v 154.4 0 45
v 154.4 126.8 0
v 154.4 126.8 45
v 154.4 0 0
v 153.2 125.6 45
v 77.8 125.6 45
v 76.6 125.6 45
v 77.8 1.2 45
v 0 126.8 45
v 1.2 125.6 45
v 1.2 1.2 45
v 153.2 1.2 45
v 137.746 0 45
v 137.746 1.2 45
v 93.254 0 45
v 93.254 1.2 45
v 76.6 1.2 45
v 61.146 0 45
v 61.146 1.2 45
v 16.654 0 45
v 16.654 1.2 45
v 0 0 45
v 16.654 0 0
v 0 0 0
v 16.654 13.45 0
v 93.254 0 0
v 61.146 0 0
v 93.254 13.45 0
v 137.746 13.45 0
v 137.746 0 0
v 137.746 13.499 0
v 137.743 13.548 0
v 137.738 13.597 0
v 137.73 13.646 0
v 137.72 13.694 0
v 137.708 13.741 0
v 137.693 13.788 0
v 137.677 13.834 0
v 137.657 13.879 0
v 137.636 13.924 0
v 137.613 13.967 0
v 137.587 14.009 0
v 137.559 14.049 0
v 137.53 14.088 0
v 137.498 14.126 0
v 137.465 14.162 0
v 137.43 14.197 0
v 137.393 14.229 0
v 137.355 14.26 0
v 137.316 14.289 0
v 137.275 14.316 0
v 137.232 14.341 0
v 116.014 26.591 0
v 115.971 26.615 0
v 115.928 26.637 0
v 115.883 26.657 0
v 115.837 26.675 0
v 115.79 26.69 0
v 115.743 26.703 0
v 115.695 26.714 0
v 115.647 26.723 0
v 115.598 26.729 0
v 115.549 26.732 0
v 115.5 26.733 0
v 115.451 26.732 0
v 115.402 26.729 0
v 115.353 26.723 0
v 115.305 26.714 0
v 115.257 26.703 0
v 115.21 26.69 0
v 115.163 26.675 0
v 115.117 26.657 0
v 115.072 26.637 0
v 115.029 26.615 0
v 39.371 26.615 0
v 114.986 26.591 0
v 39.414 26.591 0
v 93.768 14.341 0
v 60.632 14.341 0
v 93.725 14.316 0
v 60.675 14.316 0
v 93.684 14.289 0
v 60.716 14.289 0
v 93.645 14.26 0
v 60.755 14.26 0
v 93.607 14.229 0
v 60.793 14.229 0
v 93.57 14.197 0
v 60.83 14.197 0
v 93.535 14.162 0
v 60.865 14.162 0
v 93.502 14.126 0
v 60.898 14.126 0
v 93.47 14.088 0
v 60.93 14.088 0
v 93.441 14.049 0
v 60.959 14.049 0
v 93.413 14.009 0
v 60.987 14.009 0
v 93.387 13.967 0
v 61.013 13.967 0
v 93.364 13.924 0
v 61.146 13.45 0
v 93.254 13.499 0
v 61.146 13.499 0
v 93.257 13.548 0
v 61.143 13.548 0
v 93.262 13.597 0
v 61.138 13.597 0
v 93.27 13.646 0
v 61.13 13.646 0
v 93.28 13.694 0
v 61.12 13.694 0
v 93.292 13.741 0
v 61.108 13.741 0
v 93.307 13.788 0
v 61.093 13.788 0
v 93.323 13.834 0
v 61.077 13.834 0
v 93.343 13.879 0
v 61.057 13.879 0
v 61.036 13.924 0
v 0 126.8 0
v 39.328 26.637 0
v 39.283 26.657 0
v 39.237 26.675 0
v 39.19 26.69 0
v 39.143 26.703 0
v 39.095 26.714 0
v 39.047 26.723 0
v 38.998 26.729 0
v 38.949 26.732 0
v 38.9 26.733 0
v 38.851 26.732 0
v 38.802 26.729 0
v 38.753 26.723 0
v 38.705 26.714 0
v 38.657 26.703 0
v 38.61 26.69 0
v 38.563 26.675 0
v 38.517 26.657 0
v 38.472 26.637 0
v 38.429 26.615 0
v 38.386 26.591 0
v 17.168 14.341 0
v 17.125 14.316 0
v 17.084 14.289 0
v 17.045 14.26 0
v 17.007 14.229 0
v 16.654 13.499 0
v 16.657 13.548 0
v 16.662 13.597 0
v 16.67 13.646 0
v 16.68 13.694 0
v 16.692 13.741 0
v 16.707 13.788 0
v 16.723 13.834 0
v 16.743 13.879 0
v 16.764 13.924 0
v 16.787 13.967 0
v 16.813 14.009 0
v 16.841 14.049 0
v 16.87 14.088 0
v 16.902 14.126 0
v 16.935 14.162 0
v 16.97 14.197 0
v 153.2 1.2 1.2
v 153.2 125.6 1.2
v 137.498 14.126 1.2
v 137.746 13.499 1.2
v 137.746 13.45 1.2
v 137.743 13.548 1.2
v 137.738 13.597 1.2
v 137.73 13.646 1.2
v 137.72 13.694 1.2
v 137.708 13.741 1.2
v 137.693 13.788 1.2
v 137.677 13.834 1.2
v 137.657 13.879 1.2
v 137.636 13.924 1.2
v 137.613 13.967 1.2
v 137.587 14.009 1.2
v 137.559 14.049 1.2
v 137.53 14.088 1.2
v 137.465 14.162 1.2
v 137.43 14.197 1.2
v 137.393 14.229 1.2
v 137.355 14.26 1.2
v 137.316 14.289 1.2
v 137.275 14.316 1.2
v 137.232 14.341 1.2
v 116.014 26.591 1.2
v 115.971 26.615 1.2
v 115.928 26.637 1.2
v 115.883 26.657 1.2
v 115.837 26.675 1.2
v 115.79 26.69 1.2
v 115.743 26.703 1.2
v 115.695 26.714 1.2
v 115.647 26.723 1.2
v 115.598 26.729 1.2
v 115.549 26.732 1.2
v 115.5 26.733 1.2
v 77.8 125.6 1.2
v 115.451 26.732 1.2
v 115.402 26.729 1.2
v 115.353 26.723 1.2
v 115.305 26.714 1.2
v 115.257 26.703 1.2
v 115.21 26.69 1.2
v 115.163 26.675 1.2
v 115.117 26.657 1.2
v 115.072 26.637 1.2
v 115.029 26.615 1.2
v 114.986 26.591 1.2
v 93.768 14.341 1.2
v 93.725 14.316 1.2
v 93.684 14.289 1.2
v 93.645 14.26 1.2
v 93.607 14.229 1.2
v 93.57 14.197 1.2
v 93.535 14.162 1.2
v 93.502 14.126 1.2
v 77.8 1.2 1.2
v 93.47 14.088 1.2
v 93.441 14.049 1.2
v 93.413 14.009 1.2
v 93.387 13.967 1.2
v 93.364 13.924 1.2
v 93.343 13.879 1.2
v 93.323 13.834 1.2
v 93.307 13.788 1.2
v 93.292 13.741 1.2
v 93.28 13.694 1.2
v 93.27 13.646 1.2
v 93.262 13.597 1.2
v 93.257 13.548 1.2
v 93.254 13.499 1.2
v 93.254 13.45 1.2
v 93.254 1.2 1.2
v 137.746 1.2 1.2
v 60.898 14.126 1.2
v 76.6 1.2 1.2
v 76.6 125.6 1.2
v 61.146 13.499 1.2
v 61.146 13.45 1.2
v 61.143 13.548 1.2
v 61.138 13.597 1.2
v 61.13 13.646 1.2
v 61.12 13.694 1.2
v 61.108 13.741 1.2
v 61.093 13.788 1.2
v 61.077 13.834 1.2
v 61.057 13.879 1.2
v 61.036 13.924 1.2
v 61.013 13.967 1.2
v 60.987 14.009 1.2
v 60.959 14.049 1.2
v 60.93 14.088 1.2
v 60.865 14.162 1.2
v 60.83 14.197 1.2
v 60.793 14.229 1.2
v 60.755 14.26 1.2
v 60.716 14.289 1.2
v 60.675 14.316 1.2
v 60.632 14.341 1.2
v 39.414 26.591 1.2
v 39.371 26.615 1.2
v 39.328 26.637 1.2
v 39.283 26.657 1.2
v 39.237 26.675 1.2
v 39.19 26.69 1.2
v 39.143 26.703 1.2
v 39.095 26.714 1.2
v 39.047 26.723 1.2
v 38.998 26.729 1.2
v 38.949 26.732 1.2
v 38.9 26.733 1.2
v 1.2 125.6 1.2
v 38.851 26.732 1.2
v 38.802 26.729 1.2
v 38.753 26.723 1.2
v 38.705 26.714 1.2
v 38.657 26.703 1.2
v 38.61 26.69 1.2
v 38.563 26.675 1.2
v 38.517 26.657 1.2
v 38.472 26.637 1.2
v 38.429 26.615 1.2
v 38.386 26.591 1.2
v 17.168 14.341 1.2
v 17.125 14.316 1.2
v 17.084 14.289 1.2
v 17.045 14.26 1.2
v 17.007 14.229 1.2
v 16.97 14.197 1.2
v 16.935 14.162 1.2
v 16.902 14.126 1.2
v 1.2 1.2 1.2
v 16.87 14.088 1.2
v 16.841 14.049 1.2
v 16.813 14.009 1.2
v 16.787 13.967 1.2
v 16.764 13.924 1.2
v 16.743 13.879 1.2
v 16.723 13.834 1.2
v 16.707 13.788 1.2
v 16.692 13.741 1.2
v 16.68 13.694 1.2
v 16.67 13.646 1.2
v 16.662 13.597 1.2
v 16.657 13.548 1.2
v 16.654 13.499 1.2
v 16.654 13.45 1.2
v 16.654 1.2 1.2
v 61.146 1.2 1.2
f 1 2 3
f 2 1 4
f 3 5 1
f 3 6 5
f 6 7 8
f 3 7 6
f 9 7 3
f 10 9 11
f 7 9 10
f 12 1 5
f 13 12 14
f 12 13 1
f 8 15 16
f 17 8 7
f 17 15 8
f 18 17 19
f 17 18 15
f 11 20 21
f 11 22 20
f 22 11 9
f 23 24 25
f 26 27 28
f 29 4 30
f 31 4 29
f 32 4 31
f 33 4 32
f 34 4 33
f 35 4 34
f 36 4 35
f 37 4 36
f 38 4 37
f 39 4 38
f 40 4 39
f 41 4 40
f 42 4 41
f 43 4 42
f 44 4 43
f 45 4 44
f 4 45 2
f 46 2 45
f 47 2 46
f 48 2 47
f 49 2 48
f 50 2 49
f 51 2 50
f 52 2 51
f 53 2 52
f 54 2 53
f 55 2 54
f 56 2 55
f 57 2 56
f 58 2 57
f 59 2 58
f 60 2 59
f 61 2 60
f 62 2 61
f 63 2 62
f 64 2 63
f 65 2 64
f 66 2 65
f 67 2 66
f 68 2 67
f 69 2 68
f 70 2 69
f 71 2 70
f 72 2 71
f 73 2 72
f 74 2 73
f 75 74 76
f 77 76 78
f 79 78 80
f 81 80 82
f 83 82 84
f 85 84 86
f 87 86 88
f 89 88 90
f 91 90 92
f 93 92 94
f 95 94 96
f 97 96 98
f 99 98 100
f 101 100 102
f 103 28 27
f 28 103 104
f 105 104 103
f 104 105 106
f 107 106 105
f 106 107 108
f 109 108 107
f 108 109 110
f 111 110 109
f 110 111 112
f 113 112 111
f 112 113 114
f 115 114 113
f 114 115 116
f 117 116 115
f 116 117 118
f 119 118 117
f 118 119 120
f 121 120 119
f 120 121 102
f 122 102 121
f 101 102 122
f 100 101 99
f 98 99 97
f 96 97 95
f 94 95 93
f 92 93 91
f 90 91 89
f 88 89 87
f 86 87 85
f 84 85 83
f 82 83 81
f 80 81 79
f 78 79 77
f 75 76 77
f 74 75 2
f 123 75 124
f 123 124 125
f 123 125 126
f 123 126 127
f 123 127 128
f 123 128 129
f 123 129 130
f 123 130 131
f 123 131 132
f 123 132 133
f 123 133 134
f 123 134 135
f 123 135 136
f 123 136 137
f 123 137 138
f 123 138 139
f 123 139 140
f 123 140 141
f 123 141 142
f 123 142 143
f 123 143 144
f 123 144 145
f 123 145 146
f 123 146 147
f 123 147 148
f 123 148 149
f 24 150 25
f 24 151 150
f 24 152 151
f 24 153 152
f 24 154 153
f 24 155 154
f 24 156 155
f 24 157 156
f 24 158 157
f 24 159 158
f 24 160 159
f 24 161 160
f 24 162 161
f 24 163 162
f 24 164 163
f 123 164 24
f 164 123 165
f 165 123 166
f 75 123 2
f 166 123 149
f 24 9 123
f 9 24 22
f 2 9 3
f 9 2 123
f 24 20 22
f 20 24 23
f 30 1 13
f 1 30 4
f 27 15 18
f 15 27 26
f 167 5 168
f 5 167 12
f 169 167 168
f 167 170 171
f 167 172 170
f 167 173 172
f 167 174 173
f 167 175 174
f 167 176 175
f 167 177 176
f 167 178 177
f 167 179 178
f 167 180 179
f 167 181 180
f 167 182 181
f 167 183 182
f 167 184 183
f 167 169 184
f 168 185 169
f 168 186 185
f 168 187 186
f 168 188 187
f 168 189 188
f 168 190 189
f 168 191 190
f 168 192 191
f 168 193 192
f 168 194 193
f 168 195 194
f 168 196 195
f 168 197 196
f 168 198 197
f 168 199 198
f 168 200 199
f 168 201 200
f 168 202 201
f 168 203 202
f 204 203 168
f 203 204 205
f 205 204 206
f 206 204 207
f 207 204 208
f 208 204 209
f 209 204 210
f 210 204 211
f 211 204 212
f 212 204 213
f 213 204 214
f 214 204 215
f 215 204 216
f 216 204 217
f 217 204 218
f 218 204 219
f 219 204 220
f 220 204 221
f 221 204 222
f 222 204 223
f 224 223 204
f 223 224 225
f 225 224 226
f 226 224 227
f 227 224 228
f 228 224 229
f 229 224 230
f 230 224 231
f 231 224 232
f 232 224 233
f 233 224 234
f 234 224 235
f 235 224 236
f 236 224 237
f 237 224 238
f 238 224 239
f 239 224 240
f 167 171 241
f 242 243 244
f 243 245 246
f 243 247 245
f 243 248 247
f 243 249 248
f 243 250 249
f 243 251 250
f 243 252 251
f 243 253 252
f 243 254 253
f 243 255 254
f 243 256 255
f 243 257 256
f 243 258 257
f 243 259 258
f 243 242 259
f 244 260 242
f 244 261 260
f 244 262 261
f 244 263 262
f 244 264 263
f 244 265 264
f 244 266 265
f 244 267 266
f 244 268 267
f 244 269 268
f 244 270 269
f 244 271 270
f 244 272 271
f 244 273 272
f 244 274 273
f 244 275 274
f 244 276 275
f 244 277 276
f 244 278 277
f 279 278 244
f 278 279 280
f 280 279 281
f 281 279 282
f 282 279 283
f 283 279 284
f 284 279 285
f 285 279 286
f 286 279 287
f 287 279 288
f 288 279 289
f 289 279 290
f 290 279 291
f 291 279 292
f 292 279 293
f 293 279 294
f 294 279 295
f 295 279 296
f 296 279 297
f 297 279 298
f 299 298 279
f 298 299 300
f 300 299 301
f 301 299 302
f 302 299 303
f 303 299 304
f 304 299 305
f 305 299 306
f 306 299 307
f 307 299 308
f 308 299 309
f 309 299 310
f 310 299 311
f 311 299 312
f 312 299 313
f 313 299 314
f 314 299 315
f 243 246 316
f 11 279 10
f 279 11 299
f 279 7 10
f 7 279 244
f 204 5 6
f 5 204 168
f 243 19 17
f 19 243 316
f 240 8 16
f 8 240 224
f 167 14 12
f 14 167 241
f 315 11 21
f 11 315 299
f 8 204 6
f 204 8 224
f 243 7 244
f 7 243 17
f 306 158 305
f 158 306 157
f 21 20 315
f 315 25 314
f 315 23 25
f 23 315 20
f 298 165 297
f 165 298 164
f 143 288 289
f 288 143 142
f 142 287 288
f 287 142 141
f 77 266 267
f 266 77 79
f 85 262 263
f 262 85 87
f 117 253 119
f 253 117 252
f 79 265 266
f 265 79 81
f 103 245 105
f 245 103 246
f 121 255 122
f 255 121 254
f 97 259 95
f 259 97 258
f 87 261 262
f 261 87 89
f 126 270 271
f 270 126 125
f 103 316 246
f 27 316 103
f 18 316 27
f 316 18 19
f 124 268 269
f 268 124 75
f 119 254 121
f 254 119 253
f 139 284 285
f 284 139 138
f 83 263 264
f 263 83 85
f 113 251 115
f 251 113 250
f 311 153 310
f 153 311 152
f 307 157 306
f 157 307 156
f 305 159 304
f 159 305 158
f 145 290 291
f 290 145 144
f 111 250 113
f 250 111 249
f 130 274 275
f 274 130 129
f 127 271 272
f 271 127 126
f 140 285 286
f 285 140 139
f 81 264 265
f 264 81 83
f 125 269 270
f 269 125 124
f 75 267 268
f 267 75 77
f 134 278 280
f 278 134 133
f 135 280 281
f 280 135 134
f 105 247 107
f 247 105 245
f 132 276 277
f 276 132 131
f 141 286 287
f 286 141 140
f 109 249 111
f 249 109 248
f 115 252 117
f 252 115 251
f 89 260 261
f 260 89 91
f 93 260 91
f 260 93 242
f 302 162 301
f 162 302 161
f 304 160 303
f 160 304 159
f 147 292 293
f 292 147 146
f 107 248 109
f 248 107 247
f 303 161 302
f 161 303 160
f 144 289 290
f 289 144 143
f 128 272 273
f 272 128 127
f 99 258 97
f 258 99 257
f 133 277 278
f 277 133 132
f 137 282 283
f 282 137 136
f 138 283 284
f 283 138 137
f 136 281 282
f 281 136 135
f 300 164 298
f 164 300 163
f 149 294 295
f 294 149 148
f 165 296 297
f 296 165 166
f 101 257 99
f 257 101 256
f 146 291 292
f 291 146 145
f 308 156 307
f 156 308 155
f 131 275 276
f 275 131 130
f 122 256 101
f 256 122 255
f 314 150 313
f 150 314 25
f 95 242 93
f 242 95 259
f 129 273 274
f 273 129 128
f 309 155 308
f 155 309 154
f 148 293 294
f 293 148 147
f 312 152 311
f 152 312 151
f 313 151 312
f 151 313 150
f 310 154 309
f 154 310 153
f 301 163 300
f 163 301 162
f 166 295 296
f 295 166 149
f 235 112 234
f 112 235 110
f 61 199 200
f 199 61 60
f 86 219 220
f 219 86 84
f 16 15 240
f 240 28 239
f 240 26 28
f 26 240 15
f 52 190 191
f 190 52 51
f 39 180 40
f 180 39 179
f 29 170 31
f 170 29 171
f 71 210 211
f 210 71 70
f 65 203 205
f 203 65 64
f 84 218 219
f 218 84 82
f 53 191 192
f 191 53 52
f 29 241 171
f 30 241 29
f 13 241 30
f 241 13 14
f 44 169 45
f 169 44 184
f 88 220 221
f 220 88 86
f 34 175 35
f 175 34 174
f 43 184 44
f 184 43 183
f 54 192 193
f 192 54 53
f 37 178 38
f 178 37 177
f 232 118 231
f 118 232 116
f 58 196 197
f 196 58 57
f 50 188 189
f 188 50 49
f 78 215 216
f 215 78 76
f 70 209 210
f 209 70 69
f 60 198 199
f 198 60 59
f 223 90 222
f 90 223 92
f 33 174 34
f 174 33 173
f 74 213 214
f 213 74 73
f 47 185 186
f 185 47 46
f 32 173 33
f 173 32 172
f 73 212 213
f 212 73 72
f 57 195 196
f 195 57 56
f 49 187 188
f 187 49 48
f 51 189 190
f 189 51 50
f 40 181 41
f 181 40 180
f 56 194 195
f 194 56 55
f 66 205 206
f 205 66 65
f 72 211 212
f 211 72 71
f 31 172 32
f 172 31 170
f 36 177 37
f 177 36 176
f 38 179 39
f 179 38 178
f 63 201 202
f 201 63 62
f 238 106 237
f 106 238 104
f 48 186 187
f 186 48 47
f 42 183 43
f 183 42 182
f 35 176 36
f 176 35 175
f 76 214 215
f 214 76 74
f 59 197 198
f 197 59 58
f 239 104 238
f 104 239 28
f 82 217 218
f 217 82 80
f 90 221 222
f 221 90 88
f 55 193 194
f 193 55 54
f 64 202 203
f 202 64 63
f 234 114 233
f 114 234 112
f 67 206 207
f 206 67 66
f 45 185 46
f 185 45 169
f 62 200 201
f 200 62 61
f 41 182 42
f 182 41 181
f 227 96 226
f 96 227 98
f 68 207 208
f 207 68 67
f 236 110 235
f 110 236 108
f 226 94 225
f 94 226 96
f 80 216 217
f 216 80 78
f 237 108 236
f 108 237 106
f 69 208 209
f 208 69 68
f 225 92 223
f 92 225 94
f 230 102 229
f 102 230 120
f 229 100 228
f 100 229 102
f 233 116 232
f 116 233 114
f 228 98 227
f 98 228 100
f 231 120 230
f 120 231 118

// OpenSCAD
// file: ../../internal/tray.scad
// Copyright 2023 Joshua Star, All Rights Reserved

include <base.scad>
include <prim.scad>

module tray_basic(inner_size, r=0, thickness=DEFAULT_THICKNESS, bottom_thickness=undef) {

	half_z = inner_size.z / 2;
	radius = min(r, half_z);

	bottom_thk = bottom_thickness != undef ? bottom_thickness : thickness;

	thk2 = thickness * 2;

	outer_size = inner_size + [thk2, thk2, bottom_thk];
	echo("tray outer dimensions are: ", outer_size);

	inner_radius = radius - thickness;

	union() {
		difference() {
			// outer shell
			if (0 < r) {
				union() {
					translate([0, 0, bottom_thk])
						cylinder_cube([outer_size.x, outer_size.y, outer_size.z - bottom_thk], r=radius);
					cylinder_cube([outer_size.x, outer_size.y, bottom_thk], inner_radius, radius);
				}
			}
			else {
				cube(outer_size);
			}
			
			// lip cutout
			if (0 < radius) {
				translate([0, 0, inner_size.z + SMALL_NUM])
					cylinder_cube([outer_size.x, outer_size.y, bottom_thk], r1=inner_radius, r2=radius);
			}

			// inner cutout
			if (0 < radius) {
				translate([thickness, thickness, bottom_thk])
					rounded_cube(inner_size + [0, 0, bottom_thk], r=inner_radius, flat_top=true);
			}
			else {
				translate([thickness, thickness, bottom_thk])
						cube(inner_size + [0, 0, bottom_thk]);
			}
		}
	}
}

module tray_divided(size, r=0, div_x=1, div_y=1, thickness=DEFAULT_THICKNESS, bottom_thickness=undef, div_height=undef, div_thickness=undef) {

	bottom_thk = bottom_thickness != undef ? bottom_thickness : thickness;

	div_thk = div_thickness != undef ? div_thickness : thickness;
	div_z = div_height != undef ? div_height : size.z;

	max_div_z = 0 == r ? size.z : size.z - bottom_thk;
	clamped_div_z = min(div_z, max_div_z);

	x_minus_div = size.x - (div_thk * (div_x - 1));
	y_minus_div = size.y - (div_thk * (div_y - 1));

	x_off = (x_minus_div / div_x) + div_thk;
	y_off = (y_minus_div / div_y) + div_thk;
	
	union() {
		tray_basic(size, r=r, thickness=thickness, bottom_thickness=bottom_thk);

		// columns, along x
		for (i=[1:1:div_x-1]) {
			translate([i * x_off, thickness, bottom_thk])
				cube([div_thk, size.y, clamped_div_z]);
		}

		// rows, along y
		for (i=[1:1:div_y-1]) {
			translate([thickness, i * y_off, bottom_thk])
				cube([size.x, div_thk, clamped_div_z]);
		}
	}
}

module notch_cutter(h, r) {
	n = 6;
	rotate([0, 0, 180 / n]) cylinder_ngon(2 * r, h, n);
}

module tray_notched(size, div_x=1, div_y=1, thickness=DEFAULT_THICKNESS, bottom_thickness=undef, div_height=undef, div_thickness=undef, notch_lo_x=true, notch_hi_x=true) {

	bottom_thk = bottom_thickness != undef ? bottom_thickness : thickness;

	div_thk = div_thickness != undef ? div_thickness : thickness;
	div_z = div_height != undef ? div_height : size.z;

	x_minus_div = size.x - (div_thk * (div_x - 1));

	x_off = (x_minus_div / div_x) + div_thk;
	
	div_bias = (div_thk - x_off) / 2;

	notch_h = size.z + bottom_thk + 2 * SMALL_NUM;
	notch_r = x_off / 3;

	difference() {
		tray_divided(size, div_x=div_x, div_y=div_y, thickness=thickness, bottom_thickness=bottom_thk, div_height=div_z, div_thickness=div_thk);

		// notch along x
		for (i=[1:1:div_x]) {

			if (notch_lo_x) {
				translate([i * x_off + div_bias, thickness, -SMALL_NUM])
					notch_cutter(notch_h, notch_r);
			}

			if (notch_hi_x) {
				translate([i * x_off + div_bias, size.y + thickness, -SMALL_NUM])
					notch_cutter(notch_h, notch_r);
			}
		}
	}
}

// --- TESTING ---

//tray_basic([240, 120, 30], r=4);

//translate([-1.2, -1.2, 0]) tray_divided([200, 100, 5], div_x=20, div_y=10);
//tray_divided([180, 120, 30], r=15, div_x=3, div_y=2, div_height=25);

//translate([-1.2, -1.2, 0]) tray_notched([200, 100, 30], div_x=20, div_y=10);
// file: ../../internal/prim.scad
// Copyright 2023 Joshua Star, All Rights Reserved

module cylinder_cube(size, r1=1, r2=1, r=undef) {
	r1 = r != undef ? r : r1;
	r2 = r != undef ? r : r2;

	r_max = max(r1, r2);
	hull() {
		translate([r_max, r_max, 0])
			cylinder(size.z, r1, r2);
		translate([size.x - r_max, r_max, 0])
			cylinder(size.z, r1, r2);
		translate([r_max, size.y - r_max, 0])
			cylinder(size.z, r1, r2);
		translate([size.x - r_max, size.y - r_max, 0])
			cylinder(size.z, r1, r2);
	}
}

module cylinder_ngon(width, h, n=6, r=1) {
	hull() {
		for (i=[0:1:n-1]) {
			angl_off = 360 / n;
			posx_off = width / 2 - r;
			rotate([0, 0, i * angl_off]) translate([posx_off, 0, 0])
				cylinder(r=r, h=h);
		}
	}
}

module cylinder_trap(size, ratio, radius=1) {
	hull() {
		half_size_x = size.x / 2;
		translate([radius - half_size_x, radius, 0])
			cylinder(r=radius, h=size.z);
		translate([half_size_x - radius, radius, 0])
			cylinder(r=radius, h=size.z);
		translate([radius - ratio * half_size_x, size.y - radius, 0])
			cylinder(r=radius, h=size.z);
		translate([ratio * half_size_x - radius, size.y - radius, 0])
			cylinder(r=radius, h=size.z);
	}
}

module rounded_cube(size, r=1, flat_top=false) {
	
	half_z = size.z / 2;
	radius = min(r, half_z);
	
	hull() {
		// bottom 'points'
		translate([radius,radius,radius]) sphere(r=radius);
		translate([size.x-radius,radius,radius]) sphere(r=radius);
		translate([radius,size.y-radius,radius]) sphere(r=radius);
		translate([size.x-radius,size.y-radius,radius]) sphere(r=radius);

		// top 'points'
		pos_z = size.z - radius;
		if (flat_top) {
			translate([radius, radius, pos_z]) cylinder(r=radius, h=radius);
			translate([size.x-radius, radius, pos_z]) cylinder(r=radius, h=radius);
			translate([radius, size.y-radius, pos_z]) cylinder(r=radius, h=radius);
			translate([size.x-radius, size.y-radius, pos_z]) cylinder(r=radius, h=radius);
		}
		else {
			translate([radius, radius, pos_z]) sphere(r=radius);
			translate([size.x-radius, radius, pos_z]) sphere(r=radius);
			translate([radius, size.y-radius, pos_z]) sphere(r=radius);
			translate([size.x-radius, size.y-radius, pos_z]) sphere(r=radius);
		}
	}
}

// --- TESTING ---

//cylinder_cube([240, 120, 30], r=8);

//cylinder_cube([240, 120, 16], r1=4, r2=8);
//cylinder_cube([240, 120, 16], r1=8, r2=4);

//cylinder_ngon(10, 5, 7, 1);

//cylinder_trap([100, 50, 30], 0.5, radius=8);

//rounded_cube([240, 120, 30], r=12);
//rounded_cube([240, 120, 30], r=12, flat_top=true);
//rounded_cube([240, 120, 30], r=30, flat_top=true);
// file: ../../internal/math.scad
// Copyright 2023 Joshua Star, All Rights Reserved

function clamp(x, lower, upper) = x < lower ? lower : (upper < x ? upper : x);
function lerp(lower, upper, s) = (upper - lower) * s + lower;
// file: ../../internal/card.scad
// Copyright 2023 Joshua Star, All Rights Reserved

TOLERANCE_MIN = [0.4, 0.4];
TOLERANCE_MAX = [0.8, 0.8];

function std_card_dim() = [67, 93] + TOLERANCE_MIN; // gray
function amer_card_dim() = [59, 91] + TOLERANCE_MIN; // green
function euro_card_dim() = [62, 94] + TOLERANCE_MIN; // purple

function mini_amer_card_dim() = [44, 67] + TOLERANCE_MIN; // yellow
function mini_euro_card_dim() = [46, 71] + TOLERANCE_MIN; // ruby

function 7won_card_dim() = [67, 103] + TOLERANCE_MAX; // brown
function tarot_card_dim() = [73, 122] + TOLERANCE_MAX; // orange

function per_card_thickness() = 0.68;

function calc_card_stack(n, padding=1.2) = n * per_card_thickness() + padding;
function calc_card_count(d, padding=1.2) = (d - padding) / per_card_thickness();
// file: ../../internal/boxes.scad
// Copyright 2023 Joshua Star, All Rights Reserved

function gamebox_common() = [286, 286, 68]; // Terraforming Mars, Wingspan

function gamebox_ffg_10() = [254, 254, 48]; // Cave Troll, Drakon (4th ed), Elder Sign
function gamebox_ffg_11() = [290, 290, 70]; // 11.5 in.
function gamebox_ffg_revised_lcg() = [280, 238, 70]; // Marvel Champions
// file: ../../internal/base.scad
// Copyright 2023 Joshua Star, All Rights Reserved

fn = $preview ? 16 : 128;
$fn = fn;

SMALL_NUM = $preview ? 0.02 : 0.001;

DEFAULT_PADDING = 1.6;
DEFAULT_THICKNESS = 1.2;

function default_padding() = DEFAULT_PADDING;
function default_thickness() = DEFAULT_THICKNESS;

function make_list(v, n) = [for(i=[0:n-1]) v];
function sum_list(v) = [for(p=v) 1] * v;
// file: ../../boardgame_tk.scad
// Copyright 2023 Joshua Star, All Rights Reserved

include <internal/base.scad>
include <internal/boxes.scad>
include <internal/card.scad>
include <internal/math.scad>
include <internal/prim.scad>
include <internal/tray.scad>

module card_display(card_size, height, num_stacks, padding=DEFAULT_PADDING, thickness=DEFAULT_THICKNESS, bottom_thickness=undef, div_thickness=undef) {

	div_thk = div_thickness != undef ? div_thickness : thickness;

	dim_x = (card_size.x + padding) * num_stacks + (div_thk * (num_stacks - 1));
	dim_y = card_size.y + padding;
	dim_z = height;

	tray_notched([dim_x, dim_y, dim_z], div_x=num_stacks, thickness=thickness, bottom_thickness=bottom_thickness, div_thickness=div_thickness, notch_hi_x=false);
}

module vertical_cutter(size, r=0.5) {
	difference() {
		translate([0, size.z, 0]) rotate([90, 0, 0])
		linear_extrude(height=size.z) {
			translate([0, r, 0])
			offset(r=-r) {
				offset(r=2*r) {
					union() {
						translate([-(size.x + 2 * r) / 2, 0, 0]) square([size.x + 2 * r, 1]);
						translate([-(size.x - 2 * r)/2, -size.y, 0]) square([size.x - 2 * r, size.y]);
					}
				}
			}
		}

		translate([-(size.x + r), -size.z, 0])
			cube([2 * (size.x + r), 3 * size.z, 2 * (size.y + r)]);
	}
}

module card_tray(card_size, stacks, num_columns=1, padding=[0.8, 0.8, 0.8], thickness=DEFAULT_THICKNESS, bottom_thickness=undef, div_height=undef, div_thickness=undef) {

	bottom_thk = bottom_thickness != undef ? bottom_thickness : thickness;

	div_thk = div_thickness != undef ? div_thickness : thickness;

	col_dim_x = card_size.y + padding.x;

	dim_x = col_dim_x * num_columns + div_thk * (num_columns - 1);
	dim_y = sum_list(stacks) + (div_thk + padding.y) * (len(stacks) - 1);
	dim_z = card_size.x + padding.z;

	div_z = div_height != undef ? div_height : dim_z;

	min_card_dim = min(card_size.x, card_size.y);
	cutter_radius = min_card_dim / 6;

	difference() {
		union() {
			tray_divided([dim_x, dim_y, dim_z], div_x=num_columns, thickness=thickness, bottom_thickness=bottom_thickness);

			div_offsets = [
				for (a=0, b=stacks[0]; a < (len(stacks) - 1); a = a + 1, b = b + (stacks[a]==undef?0:stacks[a]) + padding.y + div_thk)
					b
				];

			// columns, along x
			for (c=[0:1:num_columns-1]) {
				// rows, along y
				for (y=div_offsets) {
					x_off = c * (col_dim_x + div_thk) + thickness;

					translate([x_off, y, bottom_thk])
						cube([col_dim_x, div_thk, div_z]);
				}
			}
		}

		cutout_size = [col_dim_x / 2, dim_z / 2, thickness + 2 * SMALL_NUM];
		cutout_z = bottom_thk + dim_z + SMALL_NUM;

		// cutout
		for (c=[0:1:num_columns-1]) {
			n = 8;

			x_off = c * (col_dim_x + div_thk) + (col_dim_x / 2) + thickness;

			// front cut
			translate([x_off, -SMALL_NUM, cutout_z])
					vertical_cutter(cutout_size, r=cutter_radius);
			
			// back cut
			translate([x_off, dim_y + thickness - SMALL_NUM, cutout_z])
					vertical_cutter(cutout_size, r=cutter_radius);
			
			// middle cut
			translate([x_off, thickness, bottom_thk + div_z + SMALL_NUM])
					vertical_cutter([cutout_size.x, div_z / 2, dim_y], r=cutter_radius);
		}
	}
}

module spacer(size, r=16, div_x=2, div_y=2, spacing=16) {
	difference() {
		cylinder_cube(size, r=r);

		half_spacing = spacing / 2;
		inner_radius = r - half_spacing;

		offset_x = size.x / div_x;
		offset_y = size.y / div_y;
		for (i=[0:1:div_x]) {
			for (j=[0:1:div_y]) {
				translate([i * offset_x + half_spacing, j * offset_y + half_spacing, -1])
				cylinder_cube([
					size.x / div_x - spacing,
					size.y / div_y - spacing,
					size.z + 2], r=inner_radius);
			}
		}
	}
}

module pegs_grid(rows=1, cols=1, radius=1, height=1, spacing=1, alt_pack=false) {
	x_start = spacing + radius;
	y_start = spacing + radius;

	x_alt_start = radius + spacing / 2;

	x_offset = 2 * radius + spacing;
	y_offset = alt_pack ? ((radius + spacing / 2) * sqrt(3)) : 2 * radius + spacing;

	for (r=[0:1:rows-1]) {
		is_alt = alt_pack ? (r % 2) : 0;
		for (c=[0:1:cols-(1 + is_alt)]) {
			translate([
					c * x_offset + x_start + x_alt_start * is_alt,
					r * y_offset + y_start,
					0])
				cylinder(h=height, r=radius);
		}
	}
}

module peg_board(rows=1, cols=1, radius=1, height=1, spacing=1) {
	difference() {
		cylinder_cube([
			cols * 2 * radius + (cols + 1) * spacing,
			rows * 2 * radius + (rows + 1) * spacing,
			height], r=radius);

		translate([0, 0, -height/2])
			pegs_grid(rows=rows, cols=cols, radius=radius, height=2*height, spacing=spacing, alt_pack=false);
	}
}

// --- TESTING ---

//card_display(mini_euro_card_dim(), 30, 3);

//vertical_cutter([100,50, 10], r=10);

//card_tray(std_card_dim(), [30, 30, 8, 8, 8, 16, 42], num_columns=4, div_height=55);

//spacer([240, 120, 10], r=16, div_x=4, div_y=3, spacing=8);

//pegs_grid(rows=4, cols=5, radius=32, height=4, spacing=6, alt_pack=false);
//pegs_grid(rows=4, cols=5, radius=32, height=4, spacing=6, alt_pack=true);

//peg_board(rows=3, cols=4, radius=28, height=4, spacing=6);
// main file
// Copyright 2023 Joshua Star, All Rights Reserved

use <../../boardgame_tk.scad>

slots = 2;

dim_z = gamebox_ffg_10().z - default_thickness() - 3;
echo("Tray should hold approximately ", calc_card_count(dim_z), " cards per slot.");

card_display(tarot_card_dim(), dim_z, slots);
